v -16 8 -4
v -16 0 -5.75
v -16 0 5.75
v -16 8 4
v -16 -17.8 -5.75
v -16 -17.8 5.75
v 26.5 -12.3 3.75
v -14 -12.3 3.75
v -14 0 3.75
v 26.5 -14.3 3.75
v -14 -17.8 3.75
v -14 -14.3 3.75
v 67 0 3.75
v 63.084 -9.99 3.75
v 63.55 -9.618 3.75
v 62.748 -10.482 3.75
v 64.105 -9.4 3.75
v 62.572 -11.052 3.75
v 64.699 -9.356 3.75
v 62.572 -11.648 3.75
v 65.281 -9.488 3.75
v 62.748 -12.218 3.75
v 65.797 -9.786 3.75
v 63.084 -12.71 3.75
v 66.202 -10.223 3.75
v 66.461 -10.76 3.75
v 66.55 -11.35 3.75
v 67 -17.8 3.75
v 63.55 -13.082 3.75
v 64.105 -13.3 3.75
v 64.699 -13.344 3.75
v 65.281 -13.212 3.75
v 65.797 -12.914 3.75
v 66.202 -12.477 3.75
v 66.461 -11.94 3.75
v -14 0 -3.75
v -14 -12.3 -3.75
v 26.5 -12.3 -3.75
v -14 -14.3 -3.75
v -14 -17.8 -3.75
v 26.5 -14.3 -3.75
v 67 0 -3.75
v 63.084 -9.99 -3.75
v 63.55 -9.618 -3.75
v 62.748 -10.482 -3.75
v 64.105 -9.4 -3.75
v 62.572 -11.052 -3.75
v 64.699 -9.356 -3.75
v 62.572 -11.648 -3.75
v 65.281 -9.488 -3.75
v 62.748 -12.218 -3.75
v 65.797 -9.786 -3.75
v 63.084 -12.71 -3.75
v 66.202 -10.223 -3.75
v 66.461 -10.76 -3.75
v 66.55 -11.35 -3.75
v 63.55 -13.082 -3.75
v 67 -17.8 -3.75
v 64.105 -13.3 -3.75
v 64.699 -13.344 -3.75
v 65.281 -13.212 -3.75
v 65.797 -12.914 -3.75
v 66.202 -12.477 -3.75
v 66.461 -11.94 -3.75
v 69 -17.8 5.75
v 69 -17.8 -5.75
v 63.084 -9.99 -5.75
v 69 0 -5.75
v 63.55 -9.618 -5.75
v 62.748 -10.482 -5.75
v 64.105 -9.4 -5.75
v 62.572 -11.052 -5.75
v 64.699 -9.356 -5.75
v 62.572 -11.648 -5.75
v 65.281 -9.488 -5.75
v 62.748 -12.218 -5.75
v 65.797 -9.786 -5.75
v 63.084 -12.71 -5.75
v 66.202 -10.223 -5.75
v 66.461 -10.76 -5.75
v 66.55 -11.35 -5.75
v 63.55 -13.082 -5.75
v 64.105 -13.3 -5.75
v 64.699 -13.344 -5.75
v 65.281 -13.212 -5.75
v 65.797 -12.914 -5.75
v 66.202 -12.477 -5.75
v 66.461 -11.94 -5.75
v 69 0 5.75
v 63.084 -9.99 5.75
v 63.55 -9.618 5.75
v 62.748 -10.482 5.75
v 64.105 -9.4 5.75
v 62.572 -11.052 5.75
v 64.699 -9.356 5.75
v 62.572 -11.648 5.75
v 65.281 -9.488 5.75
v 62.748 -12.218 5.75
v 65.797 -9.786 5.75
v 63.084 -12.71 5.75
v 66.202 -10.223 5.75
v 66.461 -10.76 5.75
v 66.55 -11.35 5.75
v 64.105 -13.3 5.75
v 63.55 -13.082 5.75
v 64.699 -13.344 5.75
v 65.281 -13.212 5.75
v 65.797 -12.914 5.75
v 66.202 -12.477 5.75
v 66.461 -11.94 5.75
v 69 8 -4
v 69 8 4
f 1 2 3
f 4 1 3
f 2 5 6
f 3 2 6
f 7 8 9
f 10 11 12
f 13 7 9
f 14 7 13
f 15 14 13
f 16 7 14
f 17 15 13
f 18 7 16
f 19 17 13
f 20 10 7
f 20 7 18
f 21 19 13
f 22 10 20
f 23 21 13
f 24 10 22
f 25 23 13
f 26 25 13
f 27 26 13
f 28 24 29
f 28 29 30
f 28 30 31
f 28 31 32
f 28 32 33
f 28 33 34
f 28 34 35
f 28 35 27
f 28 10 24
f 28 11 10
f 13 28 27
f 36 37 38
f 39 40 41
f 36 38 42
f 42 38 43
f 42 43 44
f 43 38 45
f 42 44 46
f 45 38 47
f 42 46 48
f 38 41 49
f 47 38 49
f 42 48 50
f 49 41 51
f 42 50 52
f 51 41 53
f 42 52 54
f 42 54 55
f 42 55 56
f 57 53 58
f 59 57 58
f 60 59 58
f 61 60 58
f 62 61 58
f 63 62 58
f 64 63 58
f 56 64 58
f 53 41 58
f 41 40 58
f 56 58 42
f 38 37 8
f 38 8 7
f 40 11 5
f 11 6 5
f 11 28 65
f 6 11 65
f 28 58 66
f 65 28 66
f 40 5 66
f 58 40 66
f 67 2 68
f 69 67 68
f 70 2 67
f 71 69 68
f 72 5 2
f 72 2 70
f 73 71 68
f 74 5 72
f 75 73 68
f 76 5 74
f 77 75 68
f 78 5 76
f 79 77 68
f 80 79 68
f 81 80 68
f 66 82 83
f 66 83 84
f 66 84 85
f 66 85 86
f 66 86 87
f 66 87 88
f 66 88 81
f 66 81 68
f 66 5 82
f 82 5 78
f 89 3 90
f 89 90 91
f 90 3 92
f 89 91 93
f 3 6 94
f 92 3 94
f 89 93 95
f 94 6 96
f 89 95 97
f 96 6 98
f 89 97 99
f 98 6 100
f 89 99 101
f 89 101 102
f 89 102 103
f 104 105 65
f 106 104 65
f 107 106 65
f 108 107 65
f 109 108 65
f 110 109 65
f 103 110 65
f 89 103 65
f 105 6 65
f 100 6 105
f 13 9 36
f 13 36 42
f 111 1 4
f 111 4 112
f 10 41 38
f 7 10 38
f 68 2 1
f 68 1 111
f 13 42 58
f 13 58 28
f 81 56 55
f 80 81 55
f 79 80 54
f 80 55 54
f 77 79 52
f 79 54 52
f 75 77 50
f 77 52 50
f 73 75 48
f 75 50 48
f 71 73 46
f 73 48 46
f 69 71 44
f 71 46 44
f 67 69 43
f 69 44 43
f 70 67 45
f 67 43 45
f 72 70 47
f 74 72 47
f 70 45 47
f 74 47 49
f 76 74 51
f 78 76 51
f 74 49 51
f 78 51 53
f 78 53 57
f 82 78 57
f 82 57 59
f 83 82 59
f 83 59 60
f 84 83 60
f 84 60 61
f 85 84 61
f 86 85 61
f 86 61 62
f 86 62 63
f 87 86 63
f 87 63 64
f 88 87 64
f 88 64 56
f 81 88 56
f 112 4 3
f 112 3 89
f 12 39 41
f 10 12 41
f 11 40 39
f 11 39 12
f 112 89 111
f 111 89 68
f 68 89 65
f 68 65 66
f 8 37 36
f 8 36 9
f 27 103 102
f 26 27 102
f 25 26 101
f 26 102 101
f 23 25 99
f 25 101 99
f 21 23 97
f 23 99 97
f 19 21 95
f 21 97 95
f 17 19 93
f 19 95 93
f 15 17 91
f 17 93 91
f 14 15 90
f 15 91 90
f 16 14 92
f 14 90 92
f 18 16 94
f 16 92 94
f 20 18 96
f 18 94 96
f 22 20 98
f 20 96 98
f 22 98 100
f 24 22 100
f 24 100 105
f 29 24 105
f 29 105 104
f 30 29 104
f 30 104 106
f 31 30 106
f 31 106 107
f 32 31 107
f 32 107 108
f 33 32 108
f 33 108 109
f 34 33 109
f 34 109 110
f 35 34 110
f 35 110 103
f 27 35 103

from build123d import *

# Parameters (mm, degrees)
BOSS_EXTRUDE1_DEPTH      = 8
BOSS_EXTRUDE1_DEPTH_BACK = 17.8
SKETCH1_W                = 138
SKETCH1_H                = 11.5
SKETCH8_R                = 2
CUT_EXTRUDE4_DEPTH       = 11.5
CHAMFER2_SIZE            = 8
CHAMFER2_SIZE2           = 1.75
CHAMFER3_SIZE            = 1.75
CHAMFER3_SIZE2           = 8
CUT_EXTRUDE5_REACH       = 75.89
SKETCH11_W               = 53
SKETCH11_H               = 11.5
SKETCH12_W               = 81
SKETCH12_H               = 7.5
CUT_EXTRUDE6_DEPTH       = 17.8
SKETCH13_W               = 40.5
SKETCH13_H               = 2
BOSS_EXTRUDE3_DEPTH      = 7.5


with BuildPart() as part:
    # Sketch1 → Boss-Extrude1 (new, two sides: drawn at the far end of the back side and taken through both)
    with BuildSketch(Plane(origin=(0, 0, 0), x_dir=(1, 0, 0), z_dir=(0, 1, 0)).offset(-BOSS_EXTRUDE1_DEPTH_BACK)):
        Rectangle(SKETCH1_W, SKETCH1_H)
    extrude(amount=BOSS_EXTRUDE1_DEPTH + BOSS_EXTRUDE1_DEPTH_BACK)

    # Sketch8 → Cut-Extrude4 (cut)
    with BuildSketch(Plane.XY.offset(5.75)):
        with Locations((64.55, -11.35)):
            Circle(SKETCH8_R)
    extrude(amount=-CUT_EXTRUDE4_DEPTH, mode=Mode.SUBTRACT)

    # Chamfer2
    chamfer2_edges = [part.edges().sort_by_distance(p)[0] for p in [
        (0, 8, 5.75),
    ]]
    chamfer2_side = [part.faces().sort_by_distance(p)[0] for p in [
        (-0.228635079, -4.877154202, 5.75),
    ]]
    chamfer(chamfer2_edges, length=CHAMFER2_SIZE, length2=CHAMFER2_SIZE2, reference=chamfer2_side[0])

    # Chamfer3
    chamfer3_edges = [part.edges().sort_by_distance(p)[0] for p in [
        (0, 8, -5.75),
    ]]
    chamfer3_side = [part.faces().sort_by_distance(p)[0] for p in [
        (0, 8, -0.875),
    ]]
    chamfer(chamfer3_edges, length=CHAMFER3_SIZE, length2=CHAMFER3_SIZE2, reference=chamfer3_side[0])

    # Cut-Extrude5: up to this face of the body (flat: up to its plane)
    cut_extrude5_end = Plane(part.part.faces().sort_by_distance((0, 8, 0))[0])
    # Sketch11 → Cut-Extrude5 (cut, up to the picked face)
    with BuildSketch(Plane.XZ.offset(17.8), mode=Mode.PRIVATE) as cut_extrude5_sk1:
        with Locations((-42.5, 0)):
            Rectangle(SKETCH11_W, SKETCH11_H)
    cut_extrude5_tool1 = split(extrude(cut_extrude5_sk1.sketch, amount=-CUT_EXTRUDE5_REACH, mode=Mode.PRIVATE), bisect_by=cut_extrude5_end, keep=Keep.BOTH, mode=Mode.PRIVATE)
    add(cut_extrude5_tool1.solids().sort_by(Axis((-42.5, -17.8, 0), (0, 1, 0)))[0], mode=Mode.SUBTRACT)

    # Sketch12 → Cut-Extrude6 (cut)
    with BuildSketch(Plane.XZ.offset(17.8)):
        with Locations((26.5, 0)):
            Rectangle(SKETCH12_W, SKETCH12_H)
    extrude(amount=-CUT_EXTRUDE6_DEPTH, mode=Mode.SUBTRACT)

    # Sketch13 → Boss-Extrude3 (add)
    with BuildSketch(Plane.XY.offset(-3.75)):
        with Locations((6.25, -13.3)):
            Rectangle(SKETCH13_W, SKETCH13_H)
    extrude(amount=BOSS_EXTRUDE3_DEPTH)


solid = part.part
